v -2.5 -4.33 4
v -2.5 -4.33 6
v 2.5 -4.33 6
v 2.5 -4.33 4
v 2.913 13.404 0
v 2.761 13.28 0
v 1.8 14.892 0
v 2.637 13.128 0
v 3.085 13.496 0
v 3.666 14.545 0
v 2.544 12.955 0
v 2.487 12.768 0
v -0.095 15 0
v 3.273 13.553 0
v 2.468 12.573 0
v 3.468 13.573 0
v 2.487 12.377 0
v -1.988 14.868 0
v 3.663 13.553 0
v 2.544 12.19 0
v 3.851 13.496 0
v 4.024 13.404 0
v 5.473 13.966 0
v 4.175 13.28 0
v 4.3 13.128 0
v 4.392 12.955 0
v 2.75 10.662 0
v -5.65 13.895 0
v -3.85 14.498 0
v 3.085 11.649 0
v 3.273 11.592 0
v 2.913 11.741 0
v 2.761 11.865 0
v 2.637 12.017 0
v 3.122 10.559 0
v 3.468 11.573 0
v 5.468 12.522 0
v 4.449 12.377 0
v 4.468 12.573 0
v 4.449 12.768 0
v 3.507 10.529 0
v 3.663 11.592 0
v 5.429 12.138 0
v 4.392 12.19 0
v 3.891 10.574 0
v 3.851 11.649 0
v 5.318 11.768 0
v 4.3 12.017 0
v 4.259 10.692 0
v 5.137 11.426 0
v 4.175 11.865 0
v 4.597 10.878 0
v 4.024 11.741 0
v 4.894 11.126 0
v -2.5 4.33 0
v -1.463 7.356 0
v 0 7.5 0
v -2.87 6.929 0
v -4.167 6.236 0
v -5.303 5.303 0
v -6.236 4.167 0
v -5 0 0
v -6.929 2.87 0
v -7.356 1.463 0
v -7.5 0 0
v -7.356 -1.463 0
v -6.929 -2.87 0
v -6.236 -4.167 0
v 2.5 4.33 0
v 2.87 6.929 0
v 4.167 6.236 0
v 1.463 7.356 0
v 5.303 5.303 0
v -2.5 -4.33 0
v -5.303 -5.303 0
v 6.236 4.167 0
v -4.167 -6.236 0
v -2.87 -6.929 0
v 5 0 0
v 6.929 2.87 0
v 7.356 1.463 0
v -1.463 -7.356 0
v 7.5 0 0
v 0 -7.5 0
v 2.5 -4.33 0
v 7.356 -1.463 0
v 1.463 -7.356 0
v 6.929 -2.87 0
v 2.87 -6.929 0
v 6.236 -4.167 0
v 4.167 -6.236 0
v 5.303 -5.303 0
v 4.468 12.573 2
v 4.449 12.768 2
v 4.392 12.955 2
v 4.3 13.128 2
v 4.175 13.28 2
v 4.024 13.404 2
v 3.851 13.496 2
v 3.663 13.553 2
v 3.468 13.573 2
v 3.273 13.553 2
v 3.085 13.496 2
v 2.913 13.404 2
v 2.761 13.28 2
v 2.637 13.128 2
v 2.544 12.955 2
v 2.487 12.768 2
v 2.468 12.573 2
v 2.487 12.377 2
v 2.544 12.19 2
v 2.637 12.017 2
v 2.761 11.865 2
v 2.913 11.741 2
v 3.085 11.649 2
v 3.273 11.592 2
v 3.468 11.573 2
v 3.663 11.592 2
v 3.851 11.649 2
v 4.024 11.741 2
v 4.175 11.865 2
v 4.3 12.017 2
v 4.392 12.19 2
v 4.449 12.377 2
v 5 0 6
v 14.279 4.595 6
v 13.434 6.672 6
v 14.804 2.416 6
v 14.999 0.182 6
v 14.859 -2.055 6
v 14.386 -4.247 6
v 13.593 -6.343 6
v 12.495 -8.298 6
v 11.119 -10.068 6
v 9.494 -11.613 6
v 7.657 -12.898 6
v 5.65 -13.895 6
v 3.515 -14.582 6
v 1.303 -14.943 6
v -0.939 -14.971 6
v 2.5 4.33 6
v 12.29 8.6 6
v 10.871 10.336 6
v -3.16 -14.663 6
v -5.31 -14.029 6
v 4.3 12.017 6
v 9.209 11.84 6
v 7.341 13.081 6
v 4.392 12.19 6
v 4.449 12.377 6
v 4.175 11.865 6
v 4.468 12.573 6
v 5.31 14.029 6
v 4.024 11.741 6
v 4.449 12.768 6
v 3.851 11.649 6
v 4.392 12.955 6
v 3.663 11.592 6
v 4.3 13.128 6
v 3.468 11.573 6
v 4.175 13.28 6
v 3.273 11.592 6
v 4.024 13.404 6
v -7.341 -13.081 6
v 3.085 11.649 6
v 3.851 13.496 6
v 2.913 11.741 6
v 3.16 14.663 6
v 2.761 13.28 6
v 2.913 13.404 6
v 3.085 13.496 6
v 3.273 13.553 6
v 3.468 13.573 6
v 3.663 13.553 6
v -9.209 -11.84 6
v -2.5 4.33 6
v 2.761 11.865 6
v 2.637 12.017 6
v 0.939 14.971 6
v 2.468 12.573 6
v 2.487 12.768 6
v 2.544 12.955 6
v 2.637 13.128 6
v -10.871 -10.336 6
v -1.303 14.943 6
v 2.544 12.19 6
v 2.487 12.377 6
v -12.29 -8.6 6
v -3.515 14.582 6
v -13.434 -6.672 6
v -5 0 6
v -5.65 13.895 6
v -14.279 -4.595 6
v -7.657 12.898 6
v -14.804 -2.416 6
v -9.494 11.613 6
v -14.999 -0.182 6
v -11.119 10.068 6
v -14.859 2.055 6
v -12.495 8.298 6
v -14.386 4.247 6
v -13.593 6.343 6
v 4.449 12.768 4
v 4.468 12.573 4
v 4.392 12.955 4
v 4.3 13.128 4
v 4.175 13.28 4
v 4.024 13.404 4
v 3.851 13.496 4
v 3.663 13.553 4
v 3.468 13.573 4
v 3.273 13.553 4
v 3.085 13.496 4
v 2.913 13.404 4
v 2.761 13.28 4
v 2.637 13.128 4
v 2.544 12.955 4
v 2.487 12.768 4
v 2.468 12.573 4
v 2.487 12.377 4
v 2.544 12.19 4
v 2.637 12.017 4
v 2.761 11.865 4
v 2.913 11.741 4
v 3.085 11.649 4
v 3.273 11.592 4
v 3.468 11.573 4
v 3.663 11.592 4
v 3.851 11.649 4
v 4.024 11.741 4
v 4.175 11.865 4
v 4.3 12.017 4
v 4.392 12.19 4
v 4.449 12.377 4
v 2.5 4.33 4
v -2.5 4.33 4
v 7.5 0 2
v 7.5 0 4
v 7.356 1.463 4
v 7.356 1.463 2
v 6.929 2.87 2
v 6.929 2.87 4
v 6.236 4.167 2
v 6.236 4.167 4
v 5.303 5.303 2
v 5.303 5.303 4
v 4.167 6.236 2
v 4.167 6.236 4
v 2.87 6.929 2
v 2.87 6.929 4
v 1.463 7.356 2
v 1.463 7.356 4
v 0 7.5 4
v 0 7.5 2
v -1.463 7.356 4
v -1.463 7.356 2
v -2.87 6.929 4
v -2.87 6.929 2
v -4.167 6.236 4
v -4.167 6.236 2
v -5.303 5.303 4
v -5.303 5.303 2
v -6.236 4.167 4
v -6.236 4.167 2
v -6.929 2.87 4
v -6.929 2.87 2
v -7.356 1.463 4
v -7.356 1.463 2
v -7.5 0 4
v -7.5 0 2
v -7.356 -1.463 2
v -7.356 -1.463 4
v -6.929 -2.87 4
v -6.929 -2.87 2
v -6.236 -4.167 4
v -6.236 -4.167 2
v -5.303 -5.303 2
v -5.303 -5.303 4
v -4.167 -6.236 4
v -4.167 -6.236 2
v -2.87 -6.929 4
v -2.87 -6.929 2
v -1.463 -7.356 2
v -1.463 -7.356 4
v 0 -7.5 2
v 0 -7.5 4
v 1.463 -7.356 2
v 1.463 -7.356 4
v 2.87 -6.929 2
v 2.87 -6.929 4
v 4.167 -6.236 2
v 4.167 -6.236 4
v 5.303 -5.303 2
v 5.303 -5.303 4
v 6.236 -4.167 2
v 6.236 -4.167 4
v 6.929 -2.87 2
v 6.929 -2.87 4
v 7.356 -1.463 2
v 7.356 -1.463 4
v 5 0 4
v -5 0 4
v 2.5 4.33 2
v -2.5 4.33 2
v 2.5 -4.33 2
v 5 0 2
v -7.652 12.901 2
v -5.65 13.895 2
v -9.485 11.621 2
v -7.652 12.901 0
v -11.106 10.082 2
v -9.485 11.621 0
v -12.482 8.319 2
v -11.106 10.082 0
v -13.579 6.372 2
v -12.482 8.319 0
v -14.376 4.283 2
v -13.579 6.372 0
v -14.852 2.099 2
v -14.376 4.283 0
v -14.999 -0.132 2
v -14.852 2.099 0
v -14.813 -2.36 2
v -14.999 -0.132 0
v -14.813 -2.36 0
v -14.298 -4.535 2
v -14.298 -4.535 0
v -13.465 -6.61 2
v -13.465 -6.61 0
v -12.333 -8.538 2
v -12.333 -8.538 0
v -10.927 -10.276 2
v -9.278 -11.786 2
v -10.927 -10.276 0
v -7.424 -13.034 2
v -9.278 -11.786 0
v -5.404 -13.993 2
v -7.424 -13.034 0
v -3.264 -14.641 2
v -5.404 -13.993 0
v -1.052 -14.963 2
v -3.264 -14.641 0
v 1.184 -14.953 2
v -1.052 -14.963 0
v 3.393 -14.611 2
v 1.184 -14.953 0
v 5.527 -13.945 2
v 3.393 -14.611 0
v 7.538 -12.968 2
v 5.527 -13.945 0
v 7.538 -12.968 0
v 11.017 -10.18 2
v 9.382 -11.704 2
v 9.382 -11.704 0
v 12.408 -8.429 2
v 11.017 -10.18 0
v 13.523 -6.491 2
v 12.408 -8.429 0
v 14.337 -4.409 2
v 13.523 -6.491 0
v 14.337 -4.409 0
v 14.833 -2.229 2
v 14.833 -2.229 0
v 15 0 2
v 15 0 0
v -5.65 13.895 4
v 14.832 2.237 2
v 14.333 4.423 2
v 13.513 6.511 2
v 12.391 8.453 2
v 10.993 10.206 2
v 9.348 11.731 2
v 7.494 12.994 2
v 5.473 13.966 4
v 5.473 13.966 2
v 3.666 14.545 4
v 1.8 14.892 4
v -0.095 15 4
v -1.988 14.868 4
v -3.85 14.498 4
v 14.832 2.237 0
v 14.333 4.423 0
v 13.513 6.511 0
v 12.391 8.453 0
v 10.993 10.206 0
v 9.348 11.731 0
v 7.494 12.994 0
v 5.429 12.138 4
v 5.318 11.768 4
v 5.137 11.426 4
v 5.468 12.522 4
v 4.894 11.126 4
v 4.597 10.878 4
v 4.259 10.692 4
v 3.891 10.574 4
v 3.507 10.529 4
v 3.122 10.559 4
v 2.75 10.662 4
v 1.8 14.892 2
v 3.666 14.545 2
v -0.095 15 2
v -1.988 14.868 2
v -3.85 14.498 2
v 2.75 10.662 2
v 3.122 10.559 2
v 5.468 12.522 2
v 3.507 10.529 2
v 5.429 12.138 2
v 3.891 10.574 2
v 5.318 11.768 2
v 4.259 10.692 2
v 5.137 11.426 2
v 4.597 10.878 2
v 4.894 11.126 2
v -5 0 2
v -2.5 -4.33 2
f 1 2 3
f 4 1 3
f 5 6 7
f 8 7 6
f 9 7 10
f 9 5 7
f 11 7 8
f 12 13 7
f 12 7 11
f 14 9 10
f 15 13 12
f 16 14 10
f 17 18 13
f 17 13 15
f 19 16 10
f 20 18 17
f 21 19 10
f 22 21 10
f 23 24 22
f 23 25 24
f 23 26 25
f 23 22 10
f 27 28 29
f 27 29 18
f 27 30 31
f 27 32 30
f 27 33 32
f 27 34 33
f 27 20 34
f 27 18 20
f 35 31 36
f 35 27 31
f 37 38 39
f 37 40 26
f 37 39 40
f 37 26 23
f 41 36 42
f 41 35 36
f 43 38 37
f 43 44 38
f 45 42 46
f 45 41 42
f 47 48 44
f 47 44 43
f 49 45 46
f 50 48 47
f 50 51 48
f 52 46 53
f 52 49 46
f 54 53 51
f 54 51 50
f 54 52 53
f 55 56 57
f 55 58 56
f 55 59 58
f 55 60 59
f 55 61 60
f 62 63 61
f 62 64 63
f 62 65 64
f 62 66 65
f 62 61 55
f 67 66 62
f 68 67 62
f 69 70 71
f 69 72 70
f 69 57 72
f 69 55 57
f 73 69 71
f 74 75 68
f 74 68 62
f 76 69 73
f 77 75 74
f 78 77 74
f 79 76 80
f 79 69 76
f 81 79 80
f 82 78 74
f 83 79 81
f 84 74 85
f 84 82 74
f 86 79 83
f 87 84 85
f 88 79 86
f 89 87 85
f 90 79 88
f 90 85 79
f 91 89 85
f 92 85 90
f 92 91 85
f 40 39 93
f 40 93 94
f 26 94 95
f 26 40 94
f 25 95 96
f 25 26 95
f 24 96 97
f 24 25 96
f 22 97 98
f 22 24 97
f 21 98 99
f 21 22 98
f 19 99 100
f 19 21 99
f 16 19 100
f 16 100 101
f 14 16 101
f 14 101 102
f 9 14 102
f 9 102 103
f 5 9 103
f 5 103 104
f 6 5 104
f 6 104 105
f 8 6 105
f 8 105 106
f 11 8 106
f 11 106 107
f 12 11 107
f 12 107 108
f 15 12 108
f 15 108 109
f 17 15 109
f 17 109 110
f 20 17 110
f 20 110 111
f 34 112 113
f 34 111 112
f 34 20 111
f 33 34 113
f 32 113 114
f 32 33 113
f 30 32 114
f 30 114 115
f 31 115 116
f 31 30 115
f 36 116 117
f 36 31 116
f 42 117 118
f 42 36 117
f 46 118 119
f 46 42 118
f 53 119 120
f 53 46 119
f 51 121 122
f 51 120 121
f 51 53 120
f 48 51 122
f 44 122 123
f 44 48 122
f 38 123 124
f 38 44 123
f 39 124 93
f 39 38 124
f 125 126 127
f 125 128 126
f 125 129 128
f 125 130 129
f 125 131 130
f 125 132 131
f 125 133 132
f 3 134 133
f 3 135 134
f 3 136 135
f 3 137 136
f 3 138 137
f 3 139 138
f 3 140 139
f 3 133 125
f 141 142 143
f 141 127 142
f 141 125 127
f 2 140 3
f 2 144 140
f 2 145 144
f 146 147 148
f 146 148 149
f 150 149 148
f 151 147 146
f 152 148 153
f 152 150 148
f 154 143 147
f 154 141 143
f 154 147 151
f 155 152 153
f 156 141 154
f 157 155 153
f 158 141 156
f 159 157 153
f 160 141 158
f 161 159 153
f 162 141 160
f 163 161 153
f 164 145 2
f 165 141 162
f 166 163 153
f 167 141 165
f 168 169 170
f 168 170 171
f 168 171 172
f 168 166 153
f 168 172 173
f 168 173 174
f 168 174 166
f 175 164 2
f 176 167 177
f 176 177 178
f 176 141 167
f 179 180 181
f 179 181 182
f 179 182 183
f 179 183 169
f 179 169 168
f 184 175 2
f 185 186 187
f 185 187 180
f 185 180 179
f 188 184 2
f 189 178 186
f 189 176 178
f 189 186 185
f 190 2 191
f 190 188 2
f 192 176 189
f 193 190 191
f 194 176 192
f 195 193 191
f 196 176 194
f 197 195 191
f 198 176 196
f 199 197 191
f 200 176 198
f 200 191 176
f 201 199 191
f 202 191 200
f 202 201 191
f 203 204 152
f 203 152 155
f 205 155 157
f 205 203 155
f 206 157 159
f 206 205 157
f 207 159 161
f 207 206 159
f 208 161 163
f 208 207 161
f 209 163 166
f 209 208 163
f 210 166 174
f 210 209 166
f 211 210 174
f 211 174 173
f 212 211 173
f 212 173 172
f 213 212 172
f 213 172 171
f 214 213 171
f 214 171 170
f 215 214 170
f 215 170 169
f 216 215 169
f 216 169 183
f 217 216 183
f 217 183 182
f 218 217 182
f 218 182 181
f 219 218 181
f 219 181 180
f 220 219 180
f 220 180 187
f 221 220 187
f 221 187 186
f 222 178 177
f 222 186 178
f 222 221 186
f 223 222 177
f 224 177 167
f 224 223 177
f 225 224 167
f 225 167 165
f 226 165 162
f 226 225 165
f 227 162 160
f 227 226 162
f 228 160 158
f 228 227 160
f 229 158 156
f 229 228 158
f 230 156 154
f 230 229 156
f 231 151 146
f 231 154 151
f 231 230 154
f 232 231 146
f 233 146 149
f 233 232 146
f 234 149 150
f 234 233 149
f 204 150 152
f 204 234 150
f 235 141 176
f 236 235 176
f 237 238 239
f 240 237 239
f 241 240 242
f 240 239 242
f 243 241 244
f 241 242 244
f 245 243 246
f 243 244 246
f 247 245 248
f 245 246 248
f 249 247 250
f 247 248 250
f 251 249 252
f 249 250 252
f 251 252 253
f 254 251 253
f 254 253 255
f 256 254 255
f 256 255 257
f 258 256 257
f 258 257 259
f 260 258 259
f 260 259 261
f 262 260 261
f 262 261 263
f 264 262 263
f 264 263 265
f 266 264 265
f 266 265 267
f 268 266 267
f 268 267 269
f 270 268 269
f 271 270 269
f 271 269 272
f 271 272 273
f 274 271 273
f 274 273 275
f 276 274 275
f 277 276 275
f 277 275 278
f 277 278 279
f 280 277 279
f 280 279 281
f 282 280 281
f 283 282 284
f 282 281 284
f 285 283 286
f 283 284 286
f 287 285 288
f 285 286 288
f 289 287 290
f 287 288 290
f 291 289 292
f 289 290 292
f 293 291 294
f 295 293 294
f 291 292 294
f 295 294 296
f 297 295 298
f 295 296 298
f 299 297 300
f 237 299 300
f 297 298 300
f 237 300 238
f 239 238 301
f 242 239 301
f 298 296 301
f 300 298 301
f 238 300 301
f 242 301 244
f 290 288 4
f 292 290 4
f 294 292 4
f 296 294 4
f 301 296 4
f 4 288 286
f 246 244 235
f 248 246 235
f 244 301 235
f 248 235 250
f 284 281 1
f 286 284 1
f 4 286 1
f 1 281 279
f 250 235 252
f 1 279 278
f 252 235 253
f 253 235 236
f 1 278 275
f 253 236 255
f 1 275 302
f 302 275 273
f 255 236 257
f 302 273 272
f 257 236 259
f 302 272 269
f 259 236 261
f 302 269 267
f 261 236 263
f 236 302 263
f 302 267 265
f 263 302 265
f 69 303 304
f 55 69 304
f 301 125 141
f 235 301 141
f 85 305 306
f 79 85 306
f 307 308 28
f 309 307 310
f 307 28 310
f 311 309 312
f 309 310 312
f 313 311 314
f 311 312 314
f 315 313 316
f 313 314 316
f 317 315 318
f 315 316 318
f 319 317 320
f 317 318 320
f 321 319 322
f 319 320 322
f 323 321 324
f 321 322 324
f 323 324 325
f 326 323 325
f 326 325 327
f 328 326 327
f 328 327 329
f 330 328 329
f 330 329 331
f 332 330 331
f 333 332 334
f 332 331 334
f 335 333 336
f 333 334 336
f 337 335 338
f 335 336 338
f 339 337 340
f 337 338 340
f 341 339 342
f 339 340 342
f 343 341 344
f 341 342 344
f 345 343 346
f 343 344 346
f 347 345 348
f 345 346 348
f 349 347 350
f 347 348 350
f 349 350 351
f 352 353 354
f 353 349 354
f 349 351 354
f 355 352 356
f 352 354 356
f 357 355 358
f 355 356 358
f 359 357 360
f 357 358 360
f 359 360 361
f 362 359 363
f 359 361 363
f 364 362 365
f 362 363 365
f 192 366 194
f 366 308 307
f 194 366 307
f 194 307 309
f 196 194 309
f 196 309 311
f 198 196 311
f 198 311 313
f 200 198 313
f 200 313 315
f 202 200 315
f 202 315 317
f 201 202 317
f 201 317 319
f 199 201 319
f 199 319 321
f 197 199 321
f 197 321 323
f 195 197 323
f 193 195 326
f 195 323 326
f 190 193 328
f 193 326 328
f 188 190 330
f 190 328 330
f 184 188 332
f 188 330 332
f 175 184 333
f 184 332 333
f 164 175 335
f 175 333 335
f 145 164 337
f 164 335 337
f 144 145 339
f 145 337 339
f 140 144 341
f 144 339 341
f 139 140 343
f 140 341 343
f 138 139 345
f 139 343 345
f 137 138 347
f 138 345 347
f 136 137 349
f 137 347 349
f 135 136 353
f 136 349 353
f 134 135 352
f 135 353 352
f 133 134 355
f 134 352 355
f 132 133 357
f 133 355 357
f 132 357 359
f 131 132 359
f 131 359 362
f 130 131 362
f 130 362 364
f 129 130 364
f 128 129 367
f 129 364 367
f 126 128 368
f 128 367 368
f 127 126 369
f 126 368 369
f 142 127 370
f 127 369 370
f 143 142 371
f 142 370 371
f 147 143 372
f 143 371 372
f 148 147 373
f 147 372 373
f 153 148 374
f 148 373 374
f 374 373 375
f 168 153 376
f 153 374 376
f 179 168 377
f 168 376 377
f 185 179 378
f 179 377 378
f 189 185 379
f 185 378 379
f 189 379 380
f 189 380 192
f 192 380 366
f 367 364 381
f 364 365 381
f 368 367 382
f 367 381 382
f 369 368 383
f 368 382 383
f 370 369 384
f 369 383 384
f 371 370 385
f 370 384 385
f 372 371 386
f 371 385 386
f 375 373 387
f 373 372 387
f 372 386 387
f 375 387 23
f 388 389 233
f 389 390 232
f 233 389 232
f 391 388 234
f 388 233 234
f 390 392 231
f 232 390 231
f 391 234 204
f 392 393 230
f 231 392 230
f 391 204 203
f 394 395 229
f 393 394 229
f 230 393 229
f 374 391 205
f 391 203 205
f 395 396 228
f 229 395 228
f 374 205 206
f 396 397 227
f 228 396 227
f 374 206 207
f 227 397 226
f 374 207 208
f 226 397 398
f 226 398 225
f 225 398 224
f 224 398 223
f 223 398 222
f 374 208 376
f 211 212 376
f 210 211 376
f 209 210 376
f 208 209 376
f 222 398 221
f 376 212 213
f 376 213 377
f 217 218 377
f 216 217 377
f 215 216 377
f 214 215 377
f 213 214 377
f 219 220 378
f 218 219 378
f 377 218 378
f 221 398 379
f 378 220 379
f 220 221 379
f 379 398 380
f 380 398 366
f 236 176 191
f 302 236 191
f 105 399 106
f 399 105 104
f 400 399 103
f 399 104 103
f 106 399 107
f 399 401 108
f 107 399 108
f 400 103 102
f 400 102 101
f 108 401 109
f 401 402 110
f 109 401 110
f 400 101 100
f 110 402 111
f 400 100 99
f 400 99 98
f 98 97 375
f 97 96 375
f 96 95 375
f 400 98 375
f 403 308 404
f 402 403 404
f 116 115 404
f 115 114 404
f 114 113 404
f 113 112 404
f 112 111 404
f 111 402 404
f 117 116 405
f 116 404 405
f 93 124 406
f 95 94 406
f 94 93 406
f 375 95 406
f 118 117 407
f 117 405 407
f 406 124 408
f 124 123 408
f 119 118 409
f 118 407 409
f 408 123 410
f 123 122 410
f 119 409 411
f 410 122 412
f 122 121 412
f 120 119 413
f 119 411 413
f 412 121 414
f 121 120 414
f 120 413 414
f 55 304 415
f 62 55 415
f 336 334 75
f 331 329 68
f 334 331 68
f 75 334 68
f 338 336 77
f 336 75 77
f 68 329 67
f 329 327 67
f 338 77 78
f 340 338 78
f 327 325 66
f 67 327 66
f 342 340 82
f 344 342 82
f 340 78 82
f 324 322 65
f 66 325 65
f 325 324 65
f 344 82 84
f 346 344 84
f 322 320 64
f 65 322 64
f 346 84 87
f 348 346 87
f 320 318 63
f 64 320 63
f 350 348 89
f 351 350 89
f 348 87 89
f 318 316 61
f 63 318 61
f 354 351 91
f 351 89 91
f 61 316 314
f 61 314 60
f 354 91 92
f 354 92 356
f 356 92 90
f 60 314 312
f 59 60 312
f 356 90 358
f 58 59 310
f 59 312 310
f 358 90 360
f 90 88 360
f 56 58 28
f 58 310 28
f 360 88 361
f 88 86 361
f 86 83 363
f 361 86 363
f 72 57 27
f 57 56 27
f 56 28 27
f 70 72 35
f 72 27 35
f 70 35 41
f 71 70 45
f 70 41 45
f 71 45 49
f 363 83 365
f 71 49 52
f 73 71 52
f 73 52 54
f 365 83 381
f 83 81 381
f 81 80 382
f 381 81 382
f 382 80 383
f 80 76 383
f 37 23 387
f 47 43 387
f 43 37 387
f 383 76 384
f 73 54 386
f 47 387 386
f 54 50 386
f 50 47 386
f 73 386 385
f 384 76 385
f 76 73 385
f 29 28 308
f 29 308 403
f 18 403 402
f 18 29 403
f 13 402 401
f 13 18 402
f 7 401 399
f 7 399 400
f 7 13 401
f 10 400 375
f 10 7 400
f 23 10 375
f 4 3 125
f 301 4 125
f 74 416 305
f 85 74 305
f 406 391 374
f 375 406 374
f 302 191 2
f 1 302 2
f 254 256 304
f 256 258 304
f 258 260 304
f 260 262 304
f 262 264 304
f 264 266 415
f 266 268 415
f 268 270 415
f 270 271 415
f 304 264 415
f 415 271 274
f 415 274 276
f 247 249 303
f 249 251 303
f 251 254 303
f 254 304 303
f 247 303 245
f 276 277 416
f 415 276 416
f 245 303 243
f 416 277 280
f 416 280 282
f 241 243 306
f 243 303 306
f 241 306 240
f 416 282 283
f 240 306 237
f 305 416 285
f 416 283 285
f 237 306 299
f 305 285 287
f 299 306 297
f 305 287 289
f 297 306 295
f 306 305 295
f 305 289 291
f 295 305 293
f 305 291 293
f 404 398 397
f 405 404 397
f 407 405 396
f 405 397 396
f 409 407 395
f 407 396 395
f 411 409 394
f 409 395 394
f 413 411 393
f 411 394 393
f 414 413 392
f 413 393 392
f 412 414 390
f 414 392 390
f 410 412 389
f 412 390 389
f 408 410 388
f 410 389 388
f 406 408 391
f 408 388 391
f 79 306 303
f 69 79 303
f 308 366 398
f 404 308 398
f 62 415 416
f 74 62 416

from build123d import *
from build123d.topology import SkipClean

# Parameters (mm, degrees)
SKETCH_1_R               = 15
EXTRUDE_1_DEPTH          = 6
CUT_EXTRUDE_1_DEPTH      = 23.045407685
SKETCH_5_R               = 7.5
CUT_EXTRUDE_2_DEPTH      = 23.045407685
EXTRUDE_START            = -2
SKETCH_6_R               = 15
EXTRUDE_4_DEPTH          = 2
SKETCH_7_R               = 15
EXTRUDE_5_DEPTH          = 2
CUT_EXTRUDE_3_DEPTH      = 22.587033145
CUT_EXTRUDE_3_DEPTH_BACK = 22.587033145
SKETCH_8_R               = 1
CUT_EXTRUDE_4_DEPTH      = 23.045407685


with BuildPart() as part:
    # 草图1 → 凸台-拉伸1 (new body)
    with BuildSketch(Plane.XY):
        Circle(SKETCH_1_R)
    extrude(amount=EXTRUDE_1_DEPTH)

    # 草图2 → 切除-拉伸1 (cut, through all)
    with BuildSketch(Plane.XY.offset(6)):
        with BuildLine():
            Line((-5.64957048, 13.895407637), (2.749675697, 10.662349694))
            ThreePointArc((2.749675697, 10.662349694), (4.597345514, 10.878128051), (5.468121165, 12.521963144))
            Line((5.468121165, 12.521963144), (5.473092316, 13.965860536))
            ThreePointArc((5.473092316, 13.965860536), (-0.095010727, 14.999699096), (-5.64957048, 13.895407637))
        make_face()
    extrude(amount=-CUT_EXTRUDE_1_DEPTH, mode=Mode.SUBTRACT)

    # 草图5 → 切除-拉伸2 (cut, through all)
    with BuildSketch(Plane.XY.offset(6)):
        Circle(SKETCH_5_R)
    extrude(amount=-CUT_EXTRUDE_2_DEPTH, mode=Mode.SUBTRACT)

    # 草图6 → 凸台-拉伸4 (add)
    with BuildSketch(Plane.XY.offset(6).offset(EXTRUDE_START)):
        Circle(SKETCH_6_R)
    extrude(amount=EXTRUDE_4_DEPTH)

    # 草图7 → 凸台-拉伸5 (add)
    with SkipClean():  # the faces are left unmerged after this step: merging them gives an invalid solid
        with BuildSketch(Plane(origin=(0, 0, 0), x_dir=(-1, 0, 0), z_dir=(0, 0, -1))):
            Circle(SKETCH_7_R)
        extrude(amount=-EXTRUDE_5_DEPTH)

    # 草图8 → 切除-拉伸3 (cut, two sides: drawn at the far end of the back side and taken through both)
    with SkipClean():  # the faces are left unmerged after this step: merging them gives an invalid solid
        with BuildSketch(Plane.XY.offset(2).offset(-CUT_EXTRUDE_3_DEPTH_BACK)):
            with Locations((3.468133018, 12.572519868)):
                Circle(SKETCH_8_R)
        extrude(amount=CUT_EXTRUDE_3_DEPTH + CUT_EXTRUDE_3_DEPTH_BACK, mode=Mode.SUBTRACT)

    # 草图9 → 切除-拉伸4 (cut, through all)
    with SkipClean():  # the faces are left unmerged after this step: merging them gives an invalid solid
        with BuildSketch(Plane.XY.offset(6)):
            Polygon((2.5, -4.330127019), (5, 0), (2.5, 4.330127019), (-2.5, 4.330127019), (-5, 0), (-2.5, -4.330127019), align=None)
        extrude(amount=-CUT_EXTRUDE_4_DEPTH, mode=Mode.SUBTRACT)


solid = part.part
